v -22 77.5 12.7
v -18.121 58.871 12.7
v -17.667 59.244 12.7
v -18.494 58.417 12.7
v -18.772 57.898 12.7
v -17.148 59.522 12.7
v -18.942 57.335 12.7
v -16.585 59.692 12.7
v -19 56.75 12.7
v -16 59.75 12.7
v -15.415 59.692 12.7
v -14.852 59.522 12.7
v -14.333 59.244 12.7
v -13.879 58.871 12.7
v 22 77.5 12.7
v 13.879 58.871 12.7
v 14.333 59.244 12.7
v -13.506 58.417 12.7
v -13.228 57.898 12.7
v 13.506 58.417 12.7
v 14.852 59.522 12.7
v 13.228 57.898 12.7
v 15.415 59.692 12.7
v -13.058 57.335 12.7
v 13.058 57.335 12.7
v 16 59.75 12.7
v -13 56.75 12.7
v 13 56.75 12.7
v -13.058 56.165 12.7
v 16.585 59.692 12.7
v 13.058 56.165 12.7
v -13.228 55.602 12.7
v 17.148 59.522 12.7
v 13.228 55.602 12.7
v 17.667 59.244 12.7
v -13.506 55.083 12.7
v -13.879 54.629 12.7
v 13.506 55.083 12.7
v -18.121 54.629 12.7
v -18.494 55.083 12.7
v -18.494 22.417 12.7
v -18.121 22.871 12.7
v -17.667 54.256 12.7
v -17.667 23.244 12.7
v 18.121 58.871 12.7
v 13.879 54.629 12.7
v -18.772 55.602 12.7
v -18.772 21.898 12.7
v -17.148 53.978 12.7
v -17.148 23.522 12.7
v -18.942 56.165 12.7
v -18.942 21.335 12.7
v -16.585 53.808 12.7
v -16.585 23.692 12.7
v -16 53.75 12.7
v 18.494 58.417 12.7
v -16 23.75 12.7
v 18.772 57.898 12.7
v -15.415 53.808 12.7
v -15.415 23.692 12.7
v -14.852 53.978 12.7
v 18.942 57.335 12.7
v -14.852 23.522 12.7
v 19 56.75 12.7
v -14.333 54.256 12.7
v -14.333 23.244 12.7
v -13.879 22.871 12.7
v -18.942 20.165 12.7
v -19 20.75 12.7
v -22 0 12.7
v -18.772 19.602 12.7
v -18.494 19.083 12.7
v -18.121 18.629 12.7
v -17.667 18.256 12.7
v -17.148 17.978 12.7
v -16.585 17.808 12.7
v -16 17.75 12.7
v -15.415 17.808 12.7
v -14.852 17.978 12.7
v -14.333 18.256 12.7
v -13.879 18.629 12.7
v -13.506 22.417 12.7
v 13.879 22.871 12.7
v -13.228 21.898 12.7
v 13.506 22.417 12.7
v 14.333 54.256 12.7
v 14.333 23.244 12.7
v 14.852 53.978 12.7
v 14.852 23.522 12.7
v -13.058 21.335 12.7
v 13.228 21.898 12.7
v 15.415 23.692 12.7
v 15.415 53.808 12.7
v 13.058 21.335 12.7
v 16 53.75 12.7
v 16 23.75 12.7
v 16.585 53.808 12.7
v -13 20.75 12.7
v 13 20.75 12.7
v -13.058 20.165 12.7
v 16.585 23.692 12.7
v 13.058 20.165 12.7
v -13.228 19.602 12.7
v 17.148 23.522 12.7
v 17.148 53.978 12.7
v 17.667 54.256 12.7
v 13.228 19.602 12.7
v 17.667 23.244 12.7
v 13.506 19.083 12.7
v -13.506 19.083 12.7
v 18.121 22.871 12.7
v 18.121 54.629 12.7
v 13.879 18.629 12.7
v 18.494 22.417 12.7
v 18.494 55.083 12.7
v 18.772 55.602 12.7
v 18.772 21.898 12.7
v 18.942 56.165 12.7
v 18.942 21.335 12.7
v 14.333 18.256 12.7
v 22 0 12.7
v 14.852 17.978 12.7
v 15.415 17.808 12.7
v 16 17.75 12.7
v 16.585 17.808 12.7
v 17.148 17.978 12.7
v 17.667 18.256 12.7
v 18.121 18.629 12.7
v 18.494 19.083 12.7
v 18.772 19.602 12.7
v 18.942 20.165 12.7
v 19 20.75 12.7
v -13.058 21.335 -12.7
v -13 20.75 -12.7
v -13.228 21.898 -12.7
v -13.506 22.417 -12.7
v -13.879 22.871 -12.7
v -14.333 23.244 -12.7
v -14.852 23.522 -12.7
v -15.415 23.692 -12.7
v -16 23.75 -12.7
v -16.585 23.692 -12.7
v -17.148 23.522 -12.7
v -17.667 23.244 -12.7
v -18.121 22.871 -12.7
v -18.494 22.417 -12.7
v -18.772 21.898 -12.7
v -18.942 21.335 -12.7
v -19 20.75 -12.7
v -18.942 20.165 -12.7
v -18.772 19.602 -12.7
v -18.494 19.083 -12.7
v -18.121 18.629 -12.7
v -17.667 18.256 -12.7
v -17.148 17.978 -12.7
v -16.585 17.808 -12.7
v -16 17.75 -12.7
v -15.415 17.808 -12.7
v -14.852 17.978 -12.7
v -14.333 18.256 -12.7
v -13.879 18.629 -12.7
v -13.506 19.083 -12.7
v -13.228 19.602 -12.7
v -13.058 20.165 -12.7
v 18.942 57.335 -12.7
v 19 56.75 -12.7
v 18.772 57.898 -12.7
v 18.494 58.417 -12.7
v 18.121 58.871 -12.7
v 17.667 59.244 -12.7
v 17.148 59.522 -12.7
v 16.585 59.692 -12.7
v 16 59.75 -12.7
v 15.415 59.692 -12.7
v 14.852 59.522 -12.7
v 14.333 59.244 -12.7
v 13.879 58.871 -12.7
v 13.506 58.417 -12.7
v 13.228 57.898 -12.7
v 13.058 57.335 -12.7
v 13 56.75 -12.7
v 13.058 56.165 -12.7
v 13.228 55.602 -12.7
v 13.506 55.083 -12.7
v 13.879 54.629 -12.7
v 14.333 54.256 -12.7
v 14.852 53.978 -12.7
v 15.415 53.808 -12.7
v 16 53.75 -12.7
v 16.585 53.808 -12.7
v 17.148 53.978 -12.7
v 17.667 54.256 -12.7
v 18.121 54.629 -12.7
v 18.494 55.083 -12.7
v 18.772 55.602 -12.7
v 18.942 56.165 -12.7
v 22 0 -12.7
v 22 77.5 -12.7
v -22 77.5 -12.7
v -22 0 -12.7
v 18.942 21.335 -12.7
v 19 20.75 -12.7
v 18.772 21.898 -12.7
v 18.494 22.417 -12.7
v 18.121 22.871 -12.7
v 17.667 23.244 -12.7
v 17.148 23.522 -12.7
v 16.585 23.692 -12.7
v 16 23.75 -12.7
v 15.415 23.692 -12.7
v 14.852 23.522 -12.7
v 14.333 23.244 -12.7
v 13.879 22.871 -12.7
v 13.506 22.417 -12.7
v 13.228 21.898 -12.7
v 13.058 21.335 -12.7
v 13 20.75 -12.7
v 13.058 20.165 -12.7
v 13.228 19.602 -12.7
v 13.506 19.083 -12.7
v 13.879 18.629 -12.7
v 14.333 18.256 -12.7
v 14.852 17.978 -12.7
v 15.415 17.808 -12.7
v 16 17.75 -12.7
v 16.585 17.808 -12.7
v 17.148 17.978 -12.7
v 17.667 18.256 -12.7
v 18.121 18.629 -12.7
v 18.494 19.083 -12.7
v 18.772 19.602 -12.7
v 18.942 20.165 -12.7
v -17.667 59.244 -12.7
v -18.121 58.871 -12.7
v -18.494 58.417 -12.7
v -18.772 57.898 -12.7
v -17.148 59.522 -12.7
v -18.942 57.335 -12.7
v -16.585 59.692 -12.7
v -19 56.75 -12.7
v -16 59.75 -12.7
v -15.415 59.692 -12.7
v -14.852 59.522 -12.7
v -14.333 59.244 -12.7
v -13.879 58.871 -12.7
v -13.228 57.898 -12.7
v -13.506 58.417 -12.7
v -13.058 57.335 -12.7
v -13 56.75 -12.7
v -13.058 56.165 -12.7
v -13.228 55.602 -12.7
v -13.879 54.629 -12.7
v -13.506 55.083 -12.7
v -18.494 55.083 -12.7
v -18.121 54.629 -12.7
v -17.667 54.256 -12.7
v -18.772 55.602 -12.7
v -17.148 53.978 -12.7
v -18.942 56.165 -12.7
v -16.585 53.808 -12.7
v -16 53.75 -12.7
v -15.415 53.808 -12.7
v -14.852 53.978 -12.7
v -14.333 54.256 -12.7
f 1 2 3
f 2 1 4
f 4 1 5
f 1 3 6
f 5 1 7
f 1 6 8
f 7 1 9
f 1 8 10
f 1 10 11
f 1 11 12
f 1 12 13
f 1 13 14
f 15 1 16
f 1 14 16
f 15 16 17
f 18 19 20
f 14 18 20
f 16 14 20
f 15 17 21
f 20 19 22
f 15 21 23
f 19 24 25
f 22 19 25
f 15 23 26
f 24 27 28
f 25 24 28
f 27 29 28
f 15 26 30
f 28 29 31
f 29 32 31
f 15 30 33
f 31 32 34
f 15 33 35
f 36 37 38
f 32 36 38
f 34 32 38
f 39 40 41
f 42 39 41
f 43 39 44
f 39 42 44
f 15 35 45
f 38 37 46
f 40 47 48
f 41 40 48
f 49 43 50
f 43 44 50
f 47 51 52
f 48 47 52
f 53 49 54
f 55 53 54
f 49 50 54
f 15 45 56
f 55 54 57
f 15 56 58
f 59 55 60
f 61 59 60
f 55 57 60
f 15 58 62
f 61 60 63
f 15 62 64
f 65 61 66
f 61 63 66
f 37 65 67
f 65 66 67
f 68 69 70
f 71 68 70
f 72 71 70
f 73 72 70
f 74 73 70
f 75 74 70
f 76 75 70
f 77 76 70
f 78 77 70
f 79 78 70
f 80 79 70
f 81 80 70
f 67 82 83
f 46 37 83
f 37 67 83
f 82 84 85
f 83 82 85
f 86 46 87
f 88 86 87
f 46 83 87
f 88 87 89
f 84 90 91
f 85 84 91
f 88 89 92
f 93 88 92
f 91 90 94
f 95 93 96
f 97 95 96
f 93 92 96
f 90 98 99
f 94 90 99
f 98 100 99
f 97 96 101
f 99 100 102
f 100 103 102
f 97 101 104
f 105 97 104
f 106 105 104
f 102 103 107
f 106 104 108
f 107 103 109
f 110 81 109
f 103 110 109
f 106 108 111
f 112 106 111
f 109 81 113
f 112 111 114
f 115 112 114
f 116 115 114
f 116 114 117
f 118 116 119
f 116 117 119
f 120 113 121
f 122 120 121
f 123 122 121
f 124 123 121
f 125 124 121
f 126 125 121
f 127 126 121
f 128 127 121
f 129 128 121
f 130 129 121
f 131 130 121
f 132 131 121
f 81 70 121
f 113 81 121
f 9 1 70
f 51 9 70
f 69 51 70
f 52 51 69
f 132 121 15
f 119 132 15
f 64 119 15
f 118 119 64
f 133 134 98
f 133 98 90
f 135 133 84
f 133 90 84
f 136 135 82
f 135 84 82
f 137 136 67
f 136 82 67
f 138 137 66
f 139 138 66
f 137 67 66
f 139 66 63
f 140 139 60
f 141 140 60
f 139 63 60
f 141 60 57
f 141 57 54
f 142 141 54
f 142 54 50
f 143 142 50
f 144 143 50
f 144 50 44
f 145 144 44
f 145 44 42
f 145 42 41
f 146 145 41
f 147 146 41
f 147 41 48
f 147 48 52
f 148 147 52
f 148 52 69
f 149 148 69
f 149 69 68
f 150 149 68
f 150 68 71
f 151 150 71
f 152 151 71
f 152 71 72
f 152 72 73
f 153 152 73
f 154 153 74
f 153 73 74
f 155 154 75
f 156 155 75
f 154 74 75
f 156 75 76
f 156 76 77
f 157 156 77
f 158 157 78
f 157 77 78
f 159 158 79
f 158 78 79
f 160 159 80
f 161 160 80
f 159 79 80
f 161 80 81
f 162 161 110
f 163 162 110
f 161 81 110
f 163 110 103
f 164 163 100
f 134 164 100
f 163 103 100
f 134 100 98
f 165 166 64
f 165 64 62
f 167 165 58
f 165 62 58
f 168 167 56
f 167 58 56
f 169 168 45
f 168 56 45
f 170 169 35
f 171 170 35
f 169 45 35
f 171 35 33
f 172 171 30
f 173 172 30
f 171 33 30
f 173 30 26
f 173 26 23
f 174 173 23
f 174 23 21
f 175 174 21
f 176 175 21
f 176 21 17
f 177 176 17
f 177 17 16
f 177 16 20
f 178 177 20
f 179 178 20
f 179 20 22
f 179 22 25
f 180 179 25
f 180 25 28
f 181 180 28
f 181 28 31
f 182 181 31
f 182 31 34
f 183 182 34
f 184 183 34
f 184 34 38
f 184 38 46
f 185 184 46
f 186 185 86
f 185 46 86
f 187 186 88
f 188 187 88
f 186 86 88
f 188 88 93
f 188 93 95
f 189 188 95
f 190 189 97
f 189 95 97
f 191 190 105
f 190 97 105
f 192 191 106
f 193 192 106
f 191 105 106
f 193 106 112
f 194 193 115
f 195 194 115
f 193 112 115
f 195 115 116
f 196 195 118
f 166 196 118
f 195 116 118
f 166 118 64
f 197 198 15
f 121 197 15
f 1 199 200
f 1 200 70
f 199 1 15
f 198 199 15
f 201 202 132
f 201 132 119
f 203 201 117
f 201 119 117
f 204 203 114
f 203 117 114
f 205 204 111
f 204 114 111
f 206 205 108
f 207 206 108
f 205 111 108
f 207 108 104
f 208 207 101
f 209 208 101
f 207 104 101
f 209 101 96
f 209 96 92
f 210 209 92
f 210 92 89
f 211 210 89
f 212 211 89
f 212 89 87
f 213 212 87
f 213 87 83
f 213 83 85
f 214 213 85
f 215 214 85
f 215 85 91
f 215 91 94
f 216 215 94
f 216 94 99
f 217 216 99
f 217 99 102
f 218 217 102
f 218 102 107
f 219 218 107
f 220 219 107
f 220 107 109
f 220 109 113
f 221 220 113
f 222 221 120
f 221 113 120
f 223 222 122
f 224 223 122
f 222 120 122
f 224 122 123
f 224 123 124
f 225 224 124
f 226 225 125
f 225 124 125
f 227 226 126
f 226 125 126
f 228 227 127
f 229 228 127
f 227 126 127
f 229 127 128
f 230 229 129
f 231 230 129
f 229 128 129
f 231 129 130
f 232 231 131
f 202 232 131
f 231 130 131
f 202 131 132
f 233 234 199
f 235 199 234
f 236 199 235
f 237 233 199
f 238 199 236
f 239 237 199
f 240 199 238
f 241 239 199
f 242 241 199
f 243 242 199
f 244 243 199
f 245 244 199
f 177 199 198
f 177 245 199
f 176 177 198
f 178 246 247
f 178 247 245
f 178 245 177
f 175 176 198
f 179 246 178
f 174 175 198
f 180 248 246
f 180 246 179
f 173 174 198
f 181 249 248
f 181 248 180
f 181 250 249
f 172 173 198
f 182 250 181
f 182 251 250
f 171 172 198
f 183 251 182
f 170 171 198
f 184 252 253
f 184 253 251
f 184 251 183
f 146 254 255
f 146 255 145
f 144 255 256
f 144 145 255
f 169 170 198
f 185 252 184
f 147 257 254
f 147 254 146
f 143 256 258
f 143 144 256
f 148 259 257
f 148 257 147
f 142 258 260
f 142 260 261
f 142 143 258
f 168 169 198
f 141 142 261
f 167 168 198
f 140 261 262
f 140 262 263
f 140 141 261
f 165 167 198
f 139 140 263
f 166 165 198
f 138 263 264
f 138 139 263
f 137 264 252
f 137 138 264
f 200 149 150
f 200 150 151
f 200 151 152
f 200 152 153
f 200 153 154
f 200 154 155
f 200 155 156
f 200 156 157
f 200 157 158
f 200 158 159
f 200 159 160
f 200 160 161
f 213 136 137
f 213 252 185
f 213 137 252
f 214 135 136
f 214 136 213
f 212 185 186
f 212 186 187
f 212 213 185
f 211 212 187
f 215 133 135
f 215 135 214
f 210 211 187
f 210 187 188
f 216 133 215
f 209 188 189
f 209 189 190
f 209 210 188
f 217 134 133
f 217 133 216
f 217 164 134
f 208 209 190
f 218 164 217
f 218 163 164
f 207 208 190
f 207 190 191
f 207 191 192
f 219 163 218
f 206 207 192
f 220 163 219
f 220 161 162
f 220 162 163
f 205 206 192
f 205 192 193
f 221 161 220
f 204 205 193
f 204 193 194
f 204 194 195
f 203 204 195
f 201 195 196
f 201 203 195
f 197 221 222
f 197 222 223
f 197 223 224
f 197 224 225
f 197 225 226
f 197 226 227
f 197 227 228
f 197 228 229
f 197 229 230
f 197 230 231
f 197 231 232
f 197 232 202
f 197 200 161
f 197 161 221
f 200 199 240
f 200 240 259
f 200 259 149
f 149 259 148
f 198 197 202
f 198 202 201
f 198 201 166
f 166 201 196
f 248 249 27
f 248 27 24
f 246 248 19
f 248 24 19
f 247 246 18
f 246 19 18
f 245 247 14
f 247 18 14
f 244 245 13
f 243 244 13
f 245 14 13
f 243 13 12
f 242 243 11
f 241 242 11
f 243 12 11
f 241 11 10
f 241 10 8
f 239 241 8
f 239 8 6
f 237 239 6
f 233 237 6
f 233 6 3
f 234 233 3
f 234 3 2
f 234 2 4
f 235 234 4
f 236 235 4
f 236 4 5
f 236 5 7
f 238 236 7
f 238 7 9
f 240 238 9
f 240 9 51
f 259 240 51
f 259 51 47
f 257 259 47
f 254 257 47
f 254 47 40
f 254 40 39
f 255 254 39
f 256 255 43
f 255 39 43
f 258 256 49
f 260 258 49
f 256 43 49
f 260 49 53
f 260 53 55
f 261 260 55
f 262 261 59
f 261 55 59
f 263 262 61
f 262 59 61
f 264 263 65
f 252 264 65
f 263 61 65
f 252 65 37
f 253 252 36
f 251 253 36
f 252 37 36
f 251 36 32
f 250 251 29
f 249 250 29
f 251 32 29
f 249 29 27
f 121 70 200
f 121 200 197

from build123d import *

# Parameters (mm, degrees)
F0_W     = 44
F0_H     = 25.4
F1_DEPTH = 77.5
F2_R     = 3
F3_DEPTH = 25.401


with BuildPart() as f1:
    # F0 (on Front) → F1 (new body)
    with BuildSketch(Plane.XZ):
        Rectangle(F0_W, F0_H)
    extrude(amount=-F1_DEPTH)

    # F2 (on face) → F3 (cut, through all)
    with BuildSketch(Plane.XY.offset(12.7)):
        with Locations((-16, 56.75)):
            Circle(F2_R)
        with Locations((-16, 20.75)):
            Circle(F2_R)
        with Locations((16, 20.75)):
            Circle(F2_R)
        with Locations((16, 56.75)):
            Circle(F2_R)
    extrude(amount=-F3_DEPTH, mode=Mode.SUBTRACT)


solid = f1.part
